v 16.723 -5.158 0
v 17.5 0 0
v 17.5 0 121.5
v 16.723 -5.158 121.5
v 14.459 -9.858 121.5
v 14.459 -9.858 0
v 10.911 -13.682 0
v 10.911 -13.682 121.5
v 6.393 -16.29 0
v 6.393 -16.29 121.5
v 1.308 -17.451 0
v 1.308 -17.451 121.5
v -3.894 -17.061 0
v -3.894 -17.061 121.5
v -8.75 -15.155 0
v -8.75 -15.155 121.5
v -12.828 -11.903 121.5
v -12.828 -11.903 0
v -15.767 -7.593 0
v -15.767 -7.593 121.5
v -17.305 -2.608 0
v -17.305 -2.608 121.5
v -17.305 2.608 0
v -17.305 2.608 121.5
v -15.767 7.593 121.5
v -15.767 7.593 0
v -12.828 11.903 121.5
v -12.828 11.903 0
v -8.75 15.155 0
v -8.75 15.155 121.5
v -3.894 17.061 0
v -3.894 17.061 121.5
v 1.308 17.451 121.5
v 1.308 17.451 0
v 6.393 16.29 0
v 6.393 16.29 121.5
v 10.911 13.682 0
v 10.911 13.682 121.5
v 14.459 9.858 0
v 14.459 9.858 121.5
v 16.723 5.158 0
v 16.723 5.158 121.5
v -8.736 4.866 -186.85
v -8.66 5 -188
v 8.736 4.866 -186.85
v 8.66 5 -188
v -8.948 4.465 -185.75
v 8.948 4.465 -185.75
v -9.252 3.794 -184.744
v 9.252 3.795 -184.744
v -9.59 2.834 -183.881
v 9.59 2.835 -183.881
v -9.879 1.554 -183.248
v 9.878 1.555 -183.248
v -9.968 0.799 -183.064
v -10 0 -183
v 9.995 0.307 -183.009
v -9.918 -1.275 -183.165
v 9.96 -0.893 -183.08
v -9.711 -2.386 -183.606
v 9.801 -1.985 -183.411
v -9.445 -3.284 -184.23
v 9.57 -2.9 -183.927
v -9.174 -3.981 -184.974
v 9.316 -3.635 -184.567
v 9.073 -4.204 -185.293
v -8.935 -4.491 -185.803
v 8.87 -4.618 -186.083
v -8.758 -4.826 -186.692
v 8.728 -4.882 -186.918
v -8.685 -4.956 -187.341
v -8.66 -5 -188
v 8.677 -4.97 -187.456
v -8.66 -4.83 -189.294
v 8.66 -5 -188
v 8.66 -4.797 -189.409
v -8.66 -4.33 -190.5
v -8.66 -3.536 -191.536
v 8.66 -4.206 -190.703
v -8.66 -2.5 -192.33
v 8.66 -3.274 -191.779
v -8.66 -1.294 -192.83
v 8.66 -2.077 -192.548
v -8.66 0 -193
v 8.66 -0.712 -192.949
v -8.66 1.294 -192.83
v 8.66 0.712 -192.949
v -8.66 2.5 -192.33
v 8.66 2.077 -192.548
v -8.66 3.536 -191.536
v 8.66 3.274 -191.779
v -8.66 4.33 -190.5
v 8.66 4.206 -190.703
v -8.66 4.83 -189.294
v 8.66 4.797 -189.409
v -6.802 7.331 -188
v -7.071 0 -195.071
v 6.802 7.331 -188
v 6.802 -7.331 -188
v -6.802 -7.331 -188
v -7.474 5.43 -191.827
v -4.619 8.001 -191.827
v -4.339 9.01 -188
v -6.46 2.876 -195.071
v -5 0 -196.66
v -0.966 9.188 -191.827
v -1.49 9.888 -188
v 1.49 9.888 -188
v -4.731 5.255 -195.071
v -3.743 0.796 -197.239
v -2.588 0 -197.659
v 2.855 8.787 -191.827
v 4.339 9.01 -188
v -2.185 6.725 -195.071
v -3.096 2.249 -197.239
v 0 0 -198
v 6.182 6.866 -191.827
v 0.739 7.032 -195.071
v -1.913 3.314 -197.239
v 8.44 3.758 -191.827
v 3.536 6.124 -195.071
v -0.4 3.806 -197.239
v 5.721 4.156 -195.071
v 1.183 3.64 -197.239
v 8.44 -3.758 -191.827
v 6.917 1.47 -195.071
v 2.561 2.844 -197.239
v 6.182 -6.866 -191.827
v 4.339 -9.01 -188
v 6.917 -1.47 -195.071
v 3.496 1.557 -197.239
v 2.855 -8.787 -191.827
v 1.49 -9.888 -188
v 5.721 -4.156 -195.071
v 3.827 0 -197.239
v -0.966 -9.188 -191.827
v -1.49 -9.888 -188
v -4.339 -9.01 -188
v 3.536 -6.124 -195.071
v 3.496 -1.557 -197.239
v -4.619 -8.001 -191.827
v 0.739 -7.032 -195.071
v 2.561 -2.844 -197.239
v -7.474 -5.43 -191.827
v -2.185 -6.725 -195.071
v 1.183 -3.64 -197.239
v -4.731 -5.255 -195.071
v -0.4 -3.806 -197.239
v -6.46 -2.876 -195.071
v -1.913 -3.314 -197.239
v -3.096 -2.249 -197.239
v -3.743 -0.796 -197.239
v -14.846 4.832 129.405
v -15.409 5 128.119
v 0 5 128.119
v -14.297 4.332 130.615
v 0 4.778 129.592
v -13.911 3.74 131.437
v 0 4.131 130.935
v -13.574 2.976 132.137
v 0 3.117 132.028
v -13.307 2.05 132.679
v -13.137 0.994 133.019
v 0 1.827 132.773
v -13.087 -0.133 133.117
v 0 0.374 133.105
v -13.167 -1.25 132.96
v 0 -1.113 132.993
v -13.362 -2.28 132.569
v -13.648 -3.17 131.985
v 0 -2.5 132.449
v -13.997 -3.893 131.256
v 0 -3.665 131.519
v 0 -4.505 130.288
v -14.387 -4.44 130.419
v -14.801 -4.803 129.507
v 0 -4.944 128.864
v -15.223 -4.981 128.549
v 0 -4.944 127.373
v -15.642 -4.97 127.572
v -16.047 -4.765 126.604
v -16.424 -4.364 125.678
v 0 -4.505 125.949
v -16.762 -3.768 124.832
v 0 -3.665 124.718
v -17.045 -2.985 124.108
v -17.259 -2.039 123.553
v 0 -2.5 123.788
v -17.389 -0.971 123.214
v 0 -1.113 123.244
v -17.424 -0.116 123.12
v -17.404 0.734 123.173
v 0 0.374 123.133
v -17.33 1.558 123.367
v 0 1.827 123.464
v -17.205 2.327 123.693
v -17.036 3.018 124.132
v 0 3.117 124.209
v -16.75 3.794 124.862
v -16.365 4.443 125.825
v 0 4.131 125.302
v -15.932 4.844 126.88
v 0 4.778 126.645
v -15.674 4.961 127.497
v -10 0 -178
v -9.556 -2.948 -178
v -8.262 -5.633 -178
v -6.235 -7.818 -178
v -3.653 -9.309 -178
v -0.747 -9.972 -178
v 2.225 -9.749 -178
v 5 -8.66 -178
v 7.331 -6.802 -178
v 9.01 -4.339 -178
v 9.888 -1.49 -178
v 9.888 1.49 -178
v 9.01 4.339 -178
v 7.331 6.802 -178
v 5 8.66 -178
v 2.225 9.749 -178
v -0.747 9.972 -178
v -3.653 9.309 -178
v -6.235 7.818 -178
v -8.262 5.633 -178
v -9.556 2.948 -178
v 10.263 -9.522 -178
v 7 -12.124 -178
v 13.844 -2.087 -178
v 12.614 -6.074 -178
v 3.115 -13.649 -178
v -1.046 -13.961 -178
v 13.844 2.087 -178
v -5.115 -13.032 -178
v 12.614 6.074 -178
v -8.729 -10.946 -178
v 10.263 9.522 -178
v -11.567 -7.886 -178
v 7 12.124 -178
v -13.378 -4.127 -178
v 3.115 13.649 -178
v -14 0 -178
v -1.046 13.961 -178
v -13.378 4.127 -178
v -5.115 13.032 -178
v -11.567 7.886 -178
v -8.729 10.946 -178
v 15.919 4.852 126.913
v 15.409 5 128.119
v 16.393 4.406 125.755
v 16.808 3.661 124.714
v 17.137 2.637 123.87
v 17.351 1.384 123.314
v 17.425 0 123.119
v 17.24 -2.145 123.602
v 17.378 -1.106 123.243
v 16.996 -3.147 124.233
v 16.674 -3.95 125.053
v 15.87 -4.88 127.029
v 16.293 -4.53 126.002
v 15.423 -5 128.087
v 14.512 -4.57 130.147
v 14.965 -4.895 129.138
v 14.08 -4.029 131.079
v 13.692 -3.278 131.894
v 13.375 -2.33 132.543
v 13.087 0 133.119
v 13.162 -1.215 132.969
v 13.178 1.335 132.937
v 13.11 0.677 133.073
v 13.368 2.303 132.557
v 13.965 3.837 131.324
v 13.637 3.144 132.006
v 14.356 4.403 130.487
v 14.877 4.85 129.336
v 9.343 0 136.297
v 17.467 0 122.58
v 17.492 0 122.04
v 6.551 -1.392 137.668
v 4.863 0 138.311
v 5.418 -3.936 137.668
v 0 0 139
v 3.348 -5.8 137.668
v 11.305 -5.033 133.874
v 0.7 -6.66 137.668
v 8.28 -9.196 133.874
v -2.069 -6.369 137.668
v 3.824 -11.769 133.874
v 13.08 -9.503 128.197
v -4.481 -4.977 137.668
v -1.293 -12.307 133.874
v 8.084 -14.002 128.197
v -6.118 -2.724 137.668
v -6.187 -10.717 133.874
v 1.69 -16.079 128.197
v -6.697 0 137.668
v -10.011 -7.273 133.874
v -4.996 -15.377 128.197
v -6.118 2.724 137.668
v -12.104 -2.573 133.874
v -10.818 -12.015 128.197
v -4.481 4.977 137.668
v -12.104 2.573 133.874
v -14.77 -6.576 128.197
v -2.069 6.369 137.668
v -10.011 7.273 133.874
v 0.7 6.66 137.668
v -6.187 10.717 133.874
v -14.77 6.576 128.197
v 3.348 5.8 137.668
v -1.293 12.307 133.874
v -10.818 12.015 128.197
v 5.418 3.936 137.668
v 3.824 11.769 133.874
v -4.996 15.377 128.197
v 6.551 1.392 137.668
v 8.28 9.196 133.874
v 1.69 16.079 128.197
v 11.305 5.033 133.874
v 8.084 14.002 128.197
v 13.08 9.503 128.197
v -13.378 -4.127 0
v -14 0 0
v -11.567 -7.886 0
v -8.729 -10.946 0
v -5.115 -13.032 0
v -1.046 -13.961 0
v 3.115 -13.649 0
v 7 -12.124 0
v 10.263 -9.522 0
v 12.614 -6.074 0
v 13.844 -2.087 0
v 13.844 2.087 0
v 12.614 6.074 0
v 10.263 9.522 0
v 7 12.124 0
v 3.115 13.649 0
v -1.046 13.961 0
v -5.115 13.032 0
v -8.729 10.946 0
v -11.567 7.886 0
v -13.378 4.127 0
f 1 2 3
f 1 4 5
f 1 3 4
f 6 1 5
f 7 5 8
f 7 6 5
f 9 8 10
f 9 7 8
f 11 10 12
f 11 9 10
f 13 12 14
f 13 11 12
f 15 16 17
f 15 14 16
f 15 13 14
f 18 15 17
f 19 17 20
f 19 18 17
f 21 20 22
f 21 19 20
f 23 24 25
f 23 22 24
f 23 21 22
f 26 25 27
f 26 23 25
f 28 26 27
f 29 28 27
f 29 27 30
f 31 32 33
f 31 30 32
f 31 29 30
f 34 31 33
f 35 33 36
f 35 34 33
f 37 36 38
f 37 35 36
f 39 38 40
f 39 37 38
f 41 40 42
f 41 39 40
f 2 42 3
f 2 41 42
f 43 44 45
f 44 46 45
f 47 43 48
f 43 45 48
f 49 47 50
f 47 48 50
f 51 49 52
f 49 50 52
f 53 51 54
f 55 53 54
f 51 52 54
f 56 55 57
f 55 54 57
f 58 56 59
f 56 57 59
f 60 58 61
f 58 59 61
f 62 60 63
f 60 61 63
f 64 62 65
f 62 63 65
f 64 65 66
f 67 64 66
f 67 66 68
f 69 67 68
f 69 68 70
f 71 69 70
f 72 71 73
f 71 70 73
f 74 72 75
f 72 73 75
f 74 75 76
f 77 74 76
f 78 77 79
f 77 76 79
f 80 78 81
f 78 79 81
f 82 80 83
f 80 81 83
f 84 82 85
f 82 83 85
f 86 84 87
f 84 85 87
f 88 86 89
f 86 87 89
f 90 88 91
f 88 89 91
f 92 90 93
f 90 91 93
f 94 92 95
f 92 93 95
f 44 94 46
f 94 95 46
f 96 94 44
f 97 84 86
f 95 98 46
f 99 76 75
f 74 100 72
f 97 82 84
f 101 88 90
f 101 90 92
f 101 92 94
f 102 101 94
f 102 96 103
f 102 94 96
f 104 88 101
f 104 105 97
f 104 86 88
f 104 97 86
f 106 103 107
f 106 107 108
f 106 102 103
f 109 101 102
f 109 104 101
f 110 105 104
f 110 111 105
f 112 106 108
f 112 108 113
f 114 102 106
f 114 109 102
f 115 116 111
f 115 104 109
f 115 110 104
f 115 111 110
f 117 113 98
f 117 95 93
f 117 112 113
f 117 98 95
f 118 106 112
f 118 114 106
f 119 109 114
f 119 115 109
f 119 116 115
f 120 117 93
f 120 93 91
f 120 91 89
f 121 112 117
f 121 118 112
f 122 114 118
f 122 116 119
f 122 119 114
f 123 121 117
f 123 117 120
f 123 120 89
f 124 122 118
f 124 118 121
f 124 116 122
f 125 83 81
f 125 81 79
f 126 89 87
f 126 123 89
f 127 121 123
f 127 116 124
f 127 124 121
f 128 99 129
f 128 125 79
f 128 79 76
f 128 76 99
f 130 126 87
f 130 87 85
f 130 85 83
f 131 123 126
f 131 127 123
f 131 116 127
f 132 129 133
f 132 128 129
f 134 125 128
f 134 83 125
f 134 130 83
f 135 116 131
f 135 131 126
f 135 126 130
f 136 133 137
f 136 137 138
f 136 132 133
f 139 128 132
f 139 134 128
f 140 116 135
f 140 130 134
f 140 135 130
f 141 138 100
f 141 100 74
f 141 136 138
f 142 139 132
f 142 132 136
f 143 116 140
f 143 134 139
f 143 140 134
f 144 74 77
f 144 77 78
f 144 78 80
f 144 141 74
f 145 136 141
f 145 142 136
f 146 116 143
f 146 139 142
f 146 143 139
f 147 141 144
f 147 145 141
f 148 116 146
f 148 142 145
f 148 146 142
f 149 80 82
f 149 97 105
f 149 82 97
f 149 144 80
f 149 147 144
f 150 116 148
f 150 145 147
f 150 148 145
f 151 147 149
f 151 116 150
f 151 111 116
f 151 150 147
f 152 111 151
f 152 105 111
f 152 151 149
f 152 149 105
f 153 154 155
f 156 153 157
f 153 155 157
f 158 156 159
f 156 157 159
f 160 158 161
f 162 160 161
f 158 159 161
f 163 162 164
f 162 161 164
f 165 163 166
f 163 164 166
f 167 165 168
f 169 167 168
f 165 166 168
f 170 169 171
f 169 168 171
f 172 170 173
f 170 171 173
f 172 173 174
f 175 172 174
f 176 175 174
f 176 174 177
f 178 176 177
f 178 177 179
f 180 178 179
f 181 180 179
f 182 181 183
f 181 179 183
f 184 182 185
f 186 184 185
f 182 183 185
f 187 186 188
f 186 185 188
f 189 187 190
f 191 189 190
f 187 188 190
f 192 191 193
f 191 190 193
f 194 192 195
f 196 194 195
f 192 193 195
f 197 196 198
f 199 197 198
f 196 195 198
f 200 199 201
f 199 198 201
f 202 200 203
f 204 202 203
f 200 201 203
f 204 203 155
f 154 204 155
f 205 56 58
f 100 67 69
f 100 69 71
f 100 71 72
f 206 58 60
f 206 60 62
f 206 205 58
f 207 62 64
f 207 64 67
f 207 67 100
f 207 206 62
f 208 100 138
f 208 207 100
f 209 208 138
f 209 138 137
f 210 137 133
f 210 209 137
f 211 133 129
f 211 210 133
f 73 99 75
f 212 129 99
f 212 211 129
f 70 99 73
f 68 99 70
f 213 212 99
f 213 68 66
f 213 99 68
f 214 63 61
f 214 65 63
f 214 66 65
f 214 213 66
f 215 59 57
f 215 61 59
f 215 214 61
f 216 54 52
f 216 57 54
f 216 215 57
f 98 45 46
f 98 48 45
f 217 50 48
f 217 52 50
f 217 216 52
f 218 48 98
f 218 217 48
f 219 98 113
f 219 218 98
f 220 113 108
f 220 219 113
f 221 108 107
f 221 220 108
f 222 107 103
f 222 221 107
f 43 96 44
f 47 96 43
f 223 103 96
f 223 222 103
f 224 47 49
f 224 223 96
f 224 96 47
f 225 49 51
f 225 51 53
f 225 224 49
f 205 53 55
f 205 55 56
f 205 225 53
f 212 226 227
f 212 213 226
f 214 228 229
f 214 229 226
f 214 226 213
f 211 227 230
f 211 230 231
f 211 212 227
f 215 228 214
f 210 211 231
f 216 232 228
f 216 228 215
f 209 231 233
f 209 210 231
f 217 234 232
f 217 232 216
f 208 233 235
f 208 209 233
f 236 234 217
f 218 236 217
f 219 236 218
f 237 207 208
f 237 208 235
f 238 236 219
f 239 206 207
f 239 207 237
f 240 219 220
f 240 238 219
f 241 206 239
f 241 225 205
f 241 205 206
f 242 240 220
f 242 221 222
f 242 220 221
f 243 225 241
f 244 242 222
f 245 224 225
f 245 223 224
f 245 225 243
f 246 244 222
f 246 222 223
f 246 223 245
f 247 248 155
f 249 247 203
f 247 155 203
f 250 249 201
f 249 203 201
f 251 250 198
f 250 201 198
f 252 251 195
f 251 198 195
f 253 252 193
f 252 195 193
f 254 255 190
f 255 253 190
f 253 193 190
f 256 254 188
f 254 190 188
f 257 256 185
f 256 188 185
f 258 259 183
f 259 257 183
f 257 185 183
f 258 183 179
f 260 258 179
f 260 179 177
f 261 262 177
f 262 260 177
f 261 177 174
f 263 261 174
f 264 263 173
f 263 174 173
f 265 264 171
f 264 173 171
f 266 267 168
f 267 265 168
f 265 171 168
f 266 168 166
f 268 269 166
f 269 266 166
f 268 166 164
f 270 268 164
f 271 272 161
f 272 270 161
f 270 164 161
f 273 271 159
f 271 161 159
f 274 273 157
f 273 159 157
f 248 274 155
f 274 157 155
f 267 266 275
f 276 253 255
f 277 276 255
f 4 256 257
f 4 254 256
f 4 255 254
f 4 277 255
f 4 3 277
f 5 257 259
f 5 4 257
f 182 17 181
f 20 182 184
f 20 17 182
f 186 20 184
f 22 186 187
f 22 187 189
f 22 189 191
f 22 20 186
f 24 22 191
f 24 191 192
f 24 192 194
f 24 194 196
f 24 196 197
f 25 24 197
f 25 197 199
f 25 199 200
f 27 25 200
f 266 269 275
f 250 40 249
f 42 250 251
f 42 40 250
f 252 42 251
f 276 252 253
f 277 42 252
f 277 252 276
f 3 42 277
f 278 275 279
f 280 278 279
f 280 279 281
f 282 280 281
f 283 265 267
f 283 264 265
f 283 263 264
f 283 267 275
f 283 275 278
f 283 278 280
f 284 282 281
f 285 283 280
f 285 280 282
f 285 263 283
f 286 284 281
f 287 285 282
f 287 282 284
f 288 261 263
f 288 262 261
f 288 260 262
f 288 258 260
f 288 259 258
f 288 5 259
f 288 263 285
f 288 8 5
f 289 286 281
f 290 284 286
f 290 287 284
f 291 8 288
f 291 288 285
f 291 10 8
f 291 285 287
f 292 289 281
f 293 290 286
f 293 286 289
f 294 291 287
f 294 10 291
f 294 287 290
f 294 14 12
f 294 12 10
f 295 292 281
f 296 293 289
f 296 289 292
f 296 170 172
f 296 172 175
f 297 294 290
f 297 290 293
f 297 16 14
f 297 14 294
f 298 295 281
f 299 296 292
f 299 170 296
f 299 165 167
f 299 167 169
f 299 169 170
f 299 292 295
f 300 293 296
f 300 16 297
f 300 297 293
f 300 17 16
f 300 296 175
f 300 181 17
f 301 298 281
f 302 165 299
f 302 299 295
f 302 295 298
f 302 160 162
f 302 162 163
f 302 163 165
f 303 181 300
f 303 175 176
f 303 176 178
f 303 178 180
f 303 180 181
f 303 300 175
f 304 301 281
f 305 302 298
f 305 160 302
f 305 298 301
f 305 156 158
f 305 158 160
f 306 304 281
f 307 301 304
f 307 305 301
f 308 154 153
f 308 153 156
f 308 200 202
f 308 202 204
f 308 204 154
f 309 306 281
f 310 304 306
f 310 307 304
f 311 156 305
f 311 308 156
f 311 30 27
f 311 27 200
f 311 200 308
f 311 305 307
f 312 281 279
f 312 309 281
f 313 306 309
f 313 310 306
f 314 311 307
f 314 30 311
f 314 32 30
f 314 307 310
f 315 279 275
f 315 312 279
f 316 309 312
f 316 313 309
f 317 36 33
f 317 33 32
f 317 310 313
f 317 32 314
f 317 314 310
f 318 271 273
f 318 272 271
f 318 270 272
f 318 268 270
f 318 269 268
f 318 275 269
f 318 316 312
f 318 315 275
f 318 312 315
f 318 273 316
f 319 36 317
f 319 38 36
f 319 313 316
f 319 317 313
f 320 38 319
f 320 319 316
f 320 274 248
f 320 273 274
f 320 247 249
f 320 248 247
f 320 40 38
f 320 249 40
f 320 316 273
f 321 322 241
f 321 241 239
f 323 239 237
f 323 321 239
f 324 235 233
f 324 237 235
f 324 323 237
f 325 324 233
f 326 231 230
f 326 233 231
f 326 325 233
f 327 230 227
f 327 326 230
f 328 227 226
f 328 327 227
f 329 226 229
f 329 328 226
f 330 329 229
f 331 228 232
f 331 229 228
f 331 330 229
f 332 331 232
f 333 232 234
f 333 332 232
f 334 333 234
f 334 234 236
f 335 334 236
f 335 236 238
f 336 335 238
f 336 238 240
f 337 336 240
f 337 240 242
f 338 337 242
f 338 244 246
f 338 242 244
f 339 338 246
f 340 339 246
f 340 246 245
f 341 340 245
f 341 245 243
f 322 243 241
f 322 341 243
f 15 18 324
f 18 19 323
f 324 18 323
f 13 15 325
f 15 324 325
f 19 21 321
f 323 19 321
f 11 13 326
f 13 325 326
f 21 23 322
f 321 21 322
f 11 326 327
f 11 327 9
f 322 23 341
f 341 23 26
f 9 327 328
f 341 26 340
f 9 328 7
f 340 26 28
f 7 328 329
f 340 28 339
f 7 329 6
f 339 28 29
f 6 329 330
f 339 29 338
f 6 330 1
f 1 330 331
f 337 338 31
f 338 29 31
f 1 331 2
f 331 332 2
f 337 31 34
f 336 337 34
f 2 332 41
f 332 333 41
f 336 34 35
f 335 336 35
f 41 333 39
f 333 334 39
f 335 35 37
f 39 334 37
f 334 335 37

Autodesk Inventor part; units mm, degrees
ref_plane "YZ Plane" through (0, 0, 0) normal (1, 0, 0) x (0, 1, 0)
ref_plane "XZ Plane" through (0, 0, 0) normal (0, 1, 0) x (-1, 0, 0)
ref_plane "XY Plane" through (0, 0, 0) normal (0, 0, 1) x (1, 0, 0)
sketch "Sketch1" plane through (0, 0, 0) normal (0, 0, 1) x (1, 0, 0)
  circle A0 centre (0, 0) radius 17.5
  dimension "D" = 35
extrude "Extrusion1" add sketch "Sketch1" along normal blind 121.5
sketch "Sketch2" plane through (0, 0, 0) normal (0, 1, 0) x (-1, 0, 0)
  line L0 (17.5, 121.5) -> (-17.5, 121.5) projected
  line L1 (0, 121.5) -> (0, 139)
  arc A0 (0, 139) -> (-17.5, 121.5) centre (0, 121.5) ccw
  line L2 (-17.5, 0) -> (-17.5, 121.5) construction
  point P0 (0, 0)
  dimension "d3" = 17.5
revolve "Revolution1" add sketch "Sketch2" angle 360 about axis through (0, 0, 121.5) along (0, 0, 1)
sketch "Sketch3" plane through (0, 0, 0) normal (0, 0, -1) x (-1, 0, 0)
  circle A0 centre (0, 0) radius 17.5 projected
  circle A1 centre (0, 0) radius 14
  dimension "d5" = 28
extrude "Extrusion2" add sketch "Sketch3" along normal blind 178 contours A1
sketch "Sketch4" plane through (0, 0, -178) normal (0, 0, -1) x (-1, 0, 0)
  circle A0 centre (0, 0) radius 10
  dimension "d8" = 20
extrude "Extrusion3" add sketch "Sketch4" along normal blind 20
fillet "Fillet1" radius 10 1 edges at (10, 0, -198)
sketch "Sketch5" plane through (0, 0, 0) normal (1, 0, 0) x (0, 1, 0)
  circle A0 centre (0, 128.1186) radius 5
  line L0 (-10, -188) -> (10, -188) projected
  circle A1 centre (0, -188) radius 5
  point P0 (0, 0)
  dimension "d12" = 10
  dimension "d13" = 10
extrude "Extrusion4" cut sketch "Sketch5" along normal through all both and the other way through all
properties part number "ANT-35"
